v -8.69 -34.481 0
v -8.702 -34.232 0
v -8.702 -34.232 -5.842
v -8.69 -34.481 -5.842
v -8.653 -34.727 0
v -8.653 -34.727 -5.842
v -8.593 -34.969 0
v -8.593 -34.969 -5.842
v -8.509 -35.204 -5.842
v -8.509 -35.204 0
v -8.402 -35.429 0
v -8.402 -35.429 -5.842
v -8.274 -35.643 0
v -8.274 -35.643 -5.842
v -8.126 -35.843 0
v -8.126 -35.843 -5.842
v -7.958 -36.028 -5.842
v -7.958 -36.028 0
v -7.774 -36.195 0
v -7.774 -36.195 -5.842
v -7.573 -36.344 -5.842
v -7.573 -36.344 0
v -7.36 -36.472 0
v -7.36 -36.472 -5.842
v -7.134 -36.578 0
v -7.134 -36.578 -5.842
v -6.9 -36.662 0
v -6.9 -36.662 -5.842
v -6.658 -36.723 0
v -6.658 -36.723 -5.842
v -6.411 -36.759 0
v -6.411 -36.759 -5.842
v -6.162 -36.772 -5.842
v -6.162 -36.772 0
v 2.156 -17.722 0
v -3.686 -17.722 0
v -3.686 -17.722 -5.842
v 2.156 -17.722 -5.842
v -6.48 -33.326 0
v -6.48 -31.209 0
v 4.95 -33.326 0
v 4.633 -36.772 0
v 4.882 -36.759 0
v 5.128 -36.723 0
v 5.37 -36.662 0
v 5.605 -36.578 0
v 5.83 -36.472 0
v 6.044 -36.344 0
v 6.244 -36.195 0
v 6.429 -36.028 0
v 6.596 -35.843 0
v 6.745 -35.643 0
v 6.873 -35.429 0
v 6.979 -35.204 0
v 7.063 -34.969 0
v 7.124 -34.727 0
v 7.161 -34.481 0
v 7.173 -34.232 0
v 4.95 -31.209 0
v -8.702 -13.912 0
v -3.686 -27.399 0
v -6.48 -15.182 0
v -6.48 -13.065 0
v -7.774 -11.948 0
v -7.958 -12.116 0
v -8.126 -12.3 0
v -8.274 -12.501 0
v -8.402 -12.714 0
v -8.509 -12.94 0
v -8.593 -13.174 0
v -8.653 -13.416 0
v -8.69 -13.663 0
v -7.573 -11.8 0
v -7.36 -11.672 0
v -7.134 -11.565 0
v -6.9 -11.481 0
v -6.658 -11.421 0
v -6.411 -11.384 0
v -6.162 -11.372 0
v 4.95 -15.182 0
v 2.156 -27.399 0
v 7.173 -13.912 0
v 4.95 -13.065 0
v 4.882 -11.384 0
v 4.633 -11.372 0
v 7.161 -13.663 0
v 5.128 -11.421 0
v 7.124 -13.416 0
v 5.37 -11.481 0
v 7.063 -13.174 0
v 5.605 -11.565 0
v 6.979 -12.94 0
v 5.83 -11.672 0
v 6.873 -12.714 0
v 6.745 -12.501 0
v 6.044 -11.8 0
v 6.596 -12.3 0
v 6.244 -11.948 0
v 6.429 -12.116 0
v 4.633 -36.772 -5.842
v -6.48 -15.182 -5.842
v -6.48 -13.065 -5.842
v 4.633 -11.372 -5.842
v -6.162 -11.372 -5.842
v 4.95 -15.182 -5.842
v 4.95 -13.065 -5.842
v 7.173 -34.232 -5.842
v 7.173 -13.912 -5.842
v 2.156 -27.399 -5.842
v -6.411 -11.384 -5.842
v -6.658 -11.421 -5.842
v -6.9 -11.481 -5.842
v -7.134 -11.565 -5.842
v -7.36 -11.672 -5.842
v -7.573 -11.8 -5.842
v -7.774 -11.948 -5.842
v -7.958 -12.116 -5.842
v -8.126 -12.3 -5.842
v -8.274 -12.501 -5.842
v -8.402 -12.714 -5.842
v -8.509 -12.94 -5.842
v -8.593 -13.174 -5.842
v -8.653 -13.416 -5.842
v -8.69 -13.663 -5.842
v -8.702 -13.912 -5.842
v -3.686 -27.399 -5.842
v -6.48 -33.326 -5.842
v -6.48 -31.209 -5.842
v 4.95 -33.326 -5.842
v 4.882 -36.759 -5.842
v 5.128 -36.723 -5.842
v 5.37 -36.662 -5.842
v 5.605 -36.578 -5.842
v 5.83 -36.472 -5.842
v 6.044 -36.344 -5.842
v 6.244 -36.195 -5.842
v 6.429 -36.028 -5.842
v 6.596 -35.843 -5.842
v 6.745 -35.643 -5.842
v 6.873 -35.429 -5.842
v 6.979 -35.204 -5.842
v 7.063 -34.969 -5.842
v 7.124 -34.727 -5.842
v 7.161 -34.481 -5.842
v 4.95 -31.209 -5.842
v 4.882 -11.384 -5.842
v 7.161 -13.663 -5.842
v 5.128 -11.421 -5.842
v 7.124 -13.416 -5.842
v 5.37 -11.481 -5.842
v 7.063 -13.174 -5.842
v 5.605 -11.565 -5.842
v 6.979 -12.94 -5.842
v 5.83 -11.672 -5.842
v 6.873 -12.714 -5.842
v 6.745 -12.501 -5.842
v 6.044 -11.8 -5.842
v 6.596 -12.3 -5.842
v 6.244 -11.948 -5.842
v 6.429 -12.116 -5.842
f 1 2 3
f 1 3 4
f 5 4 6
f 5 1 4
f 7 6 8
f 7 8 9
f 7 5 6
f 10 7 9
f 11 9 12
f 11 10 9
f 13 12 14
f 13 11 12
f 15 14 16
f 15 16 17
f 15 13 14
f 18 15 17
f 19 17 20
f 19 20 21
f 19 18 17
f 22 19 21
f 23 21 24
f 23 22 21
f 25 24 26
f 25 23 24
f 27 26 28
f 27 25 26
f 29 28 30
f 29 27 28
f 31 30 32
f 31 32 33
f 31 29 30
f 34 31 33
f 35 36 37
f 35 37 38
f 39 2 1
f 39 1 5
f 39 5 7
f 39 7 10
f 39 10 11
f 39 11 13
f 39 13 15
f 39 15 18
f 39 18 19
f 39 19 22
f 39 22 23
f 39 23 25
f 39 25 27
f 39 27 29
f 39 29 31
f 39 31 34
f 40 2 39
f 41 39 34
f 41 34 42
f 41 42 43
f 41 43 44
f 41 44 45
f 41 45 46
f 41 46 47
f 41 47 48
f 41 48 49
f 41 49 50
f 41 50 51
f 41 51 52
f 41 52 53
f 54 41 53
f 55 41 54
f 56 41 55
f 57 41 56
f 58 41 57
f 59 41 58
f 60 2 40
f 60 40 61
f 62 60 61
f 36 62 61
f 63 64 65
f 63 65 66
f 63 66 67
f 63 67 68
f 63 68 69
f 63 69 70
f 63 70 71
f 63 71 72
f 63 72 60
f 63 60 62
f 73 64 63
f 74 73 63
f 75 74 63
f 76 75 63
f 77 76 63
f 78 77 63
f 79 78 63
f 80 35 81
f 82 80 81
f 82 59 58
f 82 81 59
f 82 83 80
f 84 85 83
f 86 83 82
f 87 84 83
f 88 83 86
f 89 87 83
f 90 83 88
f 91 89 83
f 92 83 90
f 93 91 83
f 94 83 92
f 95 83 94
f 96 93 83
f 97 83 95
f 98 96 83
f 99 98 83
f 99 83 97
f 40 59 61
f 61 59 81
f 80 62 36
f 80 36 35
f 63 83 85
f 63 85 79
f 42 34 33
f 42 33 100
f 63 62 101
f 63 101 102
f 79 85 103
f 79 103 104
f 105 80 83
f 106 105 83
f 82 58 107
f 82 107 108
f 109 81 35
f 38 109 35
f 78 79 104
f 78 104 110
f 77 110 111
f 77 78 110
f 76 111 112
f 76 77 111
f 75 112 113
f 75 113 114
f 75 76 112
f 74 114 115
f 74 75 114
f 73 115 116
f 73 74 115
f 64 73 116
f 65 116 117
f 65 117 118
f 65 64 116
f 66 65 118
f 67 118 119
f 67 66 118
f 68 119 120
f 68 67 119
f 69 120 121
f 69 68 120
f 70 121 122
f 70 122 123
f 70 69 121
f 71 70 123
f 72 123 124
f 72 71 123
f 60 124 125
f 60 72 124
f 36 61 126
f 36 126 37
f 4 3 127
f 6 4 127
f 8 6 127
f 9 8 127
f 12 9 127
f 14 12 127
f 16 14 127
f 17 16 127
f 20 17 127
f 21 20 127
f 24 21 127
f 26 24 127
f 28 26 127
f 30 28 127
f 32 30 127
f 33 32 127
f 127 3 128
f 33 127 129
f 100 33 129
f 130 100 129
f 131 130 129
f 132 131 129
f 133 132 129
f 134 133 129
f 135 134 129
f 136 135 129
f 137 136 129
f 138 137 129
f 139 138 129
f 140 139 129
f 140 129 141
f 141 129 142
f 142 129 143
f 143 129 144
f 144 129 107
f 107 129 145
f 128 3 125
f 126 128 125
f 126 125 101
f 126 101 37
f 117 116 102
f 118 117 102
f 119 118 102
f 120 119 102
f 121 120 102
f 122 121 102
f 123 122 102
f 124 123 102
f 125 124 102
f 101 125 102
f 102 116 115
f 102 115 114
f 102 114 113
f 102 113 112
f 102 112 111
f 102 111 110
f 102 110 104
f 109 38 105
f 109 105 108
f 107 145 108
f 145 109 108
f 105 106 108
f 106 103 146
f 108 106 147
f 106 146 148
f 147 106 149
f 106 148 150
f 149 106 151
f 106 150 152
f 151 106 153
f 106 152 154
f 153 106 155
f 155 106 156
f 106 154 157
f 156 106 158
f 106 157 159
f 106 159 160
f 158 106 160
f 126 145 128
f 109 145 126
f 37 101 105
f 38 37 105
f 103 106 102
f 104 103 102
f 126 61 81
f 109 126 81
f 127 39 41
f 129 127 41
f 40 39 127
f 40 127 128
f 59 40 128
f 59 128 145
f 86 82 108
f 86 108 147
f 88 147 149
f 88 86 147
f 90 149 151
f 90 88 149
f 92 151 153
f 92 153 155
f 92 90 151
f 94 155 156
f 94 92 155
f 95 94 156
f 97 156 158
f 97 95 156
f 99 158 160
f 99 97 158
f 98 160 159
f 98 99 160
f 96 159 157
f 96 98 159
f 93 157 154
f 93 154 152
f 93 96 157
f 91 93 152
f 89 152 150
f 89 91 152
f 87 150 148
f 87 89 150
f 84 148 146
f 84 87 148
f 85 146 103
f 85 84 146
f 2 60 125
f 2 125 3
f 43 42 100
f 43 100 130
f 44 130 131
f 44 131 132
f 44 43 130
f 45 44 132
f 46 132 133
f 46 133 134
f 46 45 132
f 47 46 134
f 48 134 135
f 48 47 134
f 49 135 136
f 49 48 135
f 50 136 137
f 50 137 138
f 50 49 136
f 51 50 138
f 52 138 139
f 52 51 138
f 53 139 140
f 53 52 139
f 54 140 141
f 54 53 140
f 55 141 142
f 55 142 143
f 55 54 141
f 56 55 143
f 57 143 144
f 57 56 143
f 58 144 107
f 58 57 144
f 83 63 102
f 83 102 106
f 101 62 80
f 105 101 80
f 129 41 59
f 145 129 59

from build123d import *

# Parameters (mm, degrees)
F1_DEPTH = 5.842
F2_W     = 5.842
F2_H     = 9.6774
F2_W_2   = 11.43
F2_H_2   = 2.116666
F2_H_3   = 2.116667
F3_DEPTH = 5.842


with BuildPart() as f1:
    # F0 (on Top) → F1 (new body)
    with BuildSketch(Plane.XY):
        with BuildLine():
            Line((4.632767, -11.371723), (-6.162233, -11.371723))
            ThreePointArc((-6.162233, -11.371723), (-7.958284, -12.115671), (-8.702233, -13.911723))
            Line((-8.702233, -13.911723), (-8.702233, -34.231723))
            ThreePointArc((-8.702233, -34.231723), (-7.958284, -36.027774), (-6.162233, -36.771723))
            Line((-6.162233, -36.771723), (4.632767, -36.771723))
            ThreePointArc((4.632767, -36.771723), (6.428818, -36.027774), (7.172767, -34.231723))
            Line((7.172767, -34.231723), (7.172767, -13.911723))
            ThreePointArc((7.172767, -13.911723), (6.428818, -12.115671), (4.632767, -11.371723))
        make_face()
    extrude(amount=-F1_DEPTH)

    # F2 (on Top) → F3 (cut, through all)
    with BuildSketch(Plane.XY):
        with Locations((-0.764733, -22.560423)):
            Rectangle(F2_W, F2_H)
        with Locations((-0.764733, -32.267456)):
            Rectangle(F2_W_2, F2_H_2)
        with Locations((-0.764733, -14.12339)):
            Rectangle(F2_W_2, F2_H_3)
    extrude(amount=-F3_DEPTH, mode=Mode.SUBTRACT)


solid = f1.part
